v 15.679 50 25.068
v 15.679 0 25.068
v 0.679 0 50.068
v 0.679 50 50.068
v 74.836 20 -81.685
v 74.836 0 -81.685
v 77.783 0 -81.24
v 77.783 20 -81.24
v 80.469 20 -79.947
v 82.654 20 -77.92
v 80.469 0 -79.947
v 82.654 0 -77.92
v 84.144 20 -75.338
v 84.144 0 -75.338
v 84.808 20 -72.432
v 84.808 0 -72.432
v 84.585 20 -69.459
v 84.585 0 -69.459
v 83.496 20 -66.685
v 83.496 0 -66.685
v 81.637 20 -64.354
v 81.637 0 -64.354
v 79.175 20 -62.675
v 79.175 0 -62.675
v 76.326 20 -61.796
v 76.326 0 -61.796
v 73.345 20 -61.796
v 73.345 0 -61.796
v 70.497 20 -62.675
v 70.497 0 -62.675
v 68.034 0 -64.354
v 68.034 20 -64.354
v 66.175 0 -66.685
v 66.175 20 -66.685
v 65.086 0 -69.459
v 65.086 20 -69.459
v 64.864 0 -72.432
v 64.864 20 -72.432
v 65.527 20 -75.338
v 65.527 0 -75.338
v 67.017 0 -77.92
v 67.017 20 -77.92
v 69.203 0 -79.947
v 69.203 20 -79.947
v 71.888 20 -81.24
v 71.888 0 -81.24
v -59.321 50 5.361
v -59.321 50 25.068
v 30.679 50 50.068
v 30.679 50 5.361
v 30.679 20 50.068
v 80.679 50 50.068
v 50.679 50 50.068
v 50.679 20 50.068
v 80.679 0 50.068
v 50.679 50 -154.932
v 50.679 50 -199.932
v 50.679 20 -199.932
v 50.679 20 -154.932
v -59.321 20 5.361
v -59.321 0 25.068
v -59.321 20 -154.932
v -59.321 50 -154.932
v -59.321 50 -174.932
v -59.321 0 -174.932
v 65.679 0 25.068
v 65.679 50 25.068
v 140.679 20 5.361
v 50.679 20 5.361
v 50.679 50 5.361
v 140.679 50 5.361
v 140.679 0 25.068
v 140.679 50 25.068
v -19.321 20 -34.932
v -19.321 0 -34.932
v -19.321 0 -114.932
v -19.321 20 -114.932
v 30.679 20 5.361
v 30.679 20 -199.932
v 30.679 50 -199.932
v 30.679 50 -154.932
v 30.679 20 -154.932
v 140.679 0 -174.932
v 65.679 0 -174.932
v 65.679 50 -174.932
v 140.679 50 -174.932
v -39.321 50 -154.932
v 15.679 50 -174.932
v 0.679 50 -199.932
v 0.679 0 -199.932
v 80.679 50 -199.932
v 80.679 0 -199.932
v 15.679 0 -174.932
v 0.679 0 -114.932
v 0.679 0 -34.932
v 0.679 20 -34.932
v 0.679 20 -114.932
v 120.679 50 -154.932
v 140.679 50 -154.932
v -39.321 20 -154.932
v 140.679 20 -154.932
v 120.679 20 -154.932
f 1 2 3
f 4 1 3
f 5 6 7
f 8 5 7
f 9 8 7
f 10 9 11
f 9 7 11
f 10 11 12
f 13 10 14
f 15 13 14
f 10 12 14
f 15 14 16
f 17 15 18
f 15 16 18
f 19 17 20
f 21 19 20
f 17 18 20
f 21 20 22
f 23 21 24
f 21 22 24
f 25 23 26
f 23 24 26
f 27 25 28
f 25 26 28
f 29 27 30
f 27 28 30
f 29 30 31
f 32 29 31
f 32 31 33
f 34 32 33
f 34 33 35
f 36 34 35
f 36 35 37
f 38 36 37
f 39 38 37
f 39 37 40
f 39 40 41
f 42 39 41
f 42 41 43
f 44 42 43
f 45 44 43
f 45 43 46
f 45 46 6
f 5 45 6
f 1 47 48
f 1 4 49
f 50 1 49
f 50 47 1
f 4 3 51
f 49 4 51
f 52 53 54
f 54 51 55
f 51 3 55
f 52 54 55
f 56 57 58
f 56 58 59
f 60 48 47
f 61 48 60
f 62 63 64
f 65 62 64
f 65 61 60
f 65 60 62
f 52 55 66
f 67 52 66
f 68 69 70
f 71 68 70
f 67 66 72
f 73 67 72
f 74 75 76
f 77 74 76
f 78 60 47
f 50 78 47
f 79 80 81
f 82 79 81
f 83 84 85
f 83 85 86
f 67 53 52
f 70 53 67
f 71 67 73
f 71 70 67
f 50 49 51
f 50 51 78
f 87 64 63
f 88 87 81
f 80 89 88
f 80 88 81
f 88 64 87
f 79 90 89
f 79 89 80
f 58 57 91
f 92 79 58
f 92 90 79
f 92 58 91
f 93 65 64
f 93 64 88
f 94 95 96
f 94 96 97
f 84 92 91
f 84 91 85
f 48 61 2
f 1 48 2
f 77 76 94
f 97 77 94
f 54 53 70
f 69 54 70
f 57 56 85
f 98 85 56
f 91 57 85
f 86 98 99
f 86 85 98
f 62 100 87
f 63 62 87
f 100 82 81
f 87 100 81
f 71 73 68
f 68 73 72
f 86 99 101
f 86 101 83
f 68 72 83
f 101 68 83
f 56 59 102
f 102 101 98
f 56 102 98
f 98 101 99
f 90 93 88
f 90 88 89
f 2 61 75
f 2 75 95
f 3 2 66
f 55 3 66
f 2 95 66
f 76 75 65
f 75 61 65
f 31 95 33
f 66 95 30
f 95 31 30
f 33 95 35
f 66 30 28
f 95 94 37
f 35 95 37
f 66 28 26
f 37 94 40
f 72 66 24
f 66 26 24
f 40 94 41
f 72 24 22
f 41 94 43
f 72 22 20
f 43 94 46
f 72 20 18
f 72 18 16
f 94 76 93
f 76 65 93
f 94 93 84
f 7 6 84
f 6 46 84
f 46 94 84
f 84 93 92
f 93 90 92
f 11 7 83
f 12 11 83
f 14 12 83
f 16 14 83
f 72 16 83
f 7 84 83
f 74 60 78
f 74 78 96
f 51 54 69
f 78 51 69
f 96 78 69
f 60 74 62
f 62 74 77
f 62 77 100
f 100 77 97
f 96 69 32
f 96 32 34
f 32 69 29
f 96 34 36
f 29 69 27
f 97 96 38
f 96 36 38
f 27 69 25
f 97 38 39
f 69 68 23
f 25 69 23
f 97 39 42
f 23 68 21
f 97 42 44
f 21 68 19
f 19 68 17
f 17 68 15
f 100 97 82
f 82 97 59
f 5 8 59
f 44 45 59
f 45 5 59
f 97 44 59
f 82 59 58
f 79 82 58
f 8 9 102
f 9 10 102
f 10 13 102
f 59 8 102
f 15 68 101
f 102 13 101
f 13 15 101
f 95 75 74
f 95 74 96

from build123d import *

# Parameters (mm, degrees)
SKETCH1_W           = 200
SKETCH1_H           = 200
SKETCH1_W_2         = 20
SKETCH1_H_2         = 80
BOSS_EXTRUDE1_DEPTH = 50
SHELL1_START        = 20.678946788
SHELL1_OUTLINE_W    = 30
SHELL1_OUTLINE_H    = 160
SHELL1_DEPTH        = 100
SHELL1_START_2      = -39.321053212
SHELL1_2_OUTLINE_W  = 30
SHELL1_2_OUTLINE_H  = 20
SHELL1_2_DEPTH      = 60
SKETCH4_W           = 60
SKETCH4_H           = 120
CUT_EXTRUDE1_DEPTH  = 30
BOSS_EXTRUDE2_DEPTH = 50
SKETCH6_W           = 20
SKETCH6_H           = 45
CUT_EXTRUDE2_DEPTH  = 30
SKETCH7_R           = 10
CUT_EXTRUDE3_DEPTH  = 28
SKETCH8_W           = 160.292931591
SKETCH8_H           = 30
CUT_EXTRUDE4_DEPTH  = 213


# Read off the part's stored shape, not the designer's step: Shell1
with BuildPart() as part:
    # Sketch1 → Boss-Extrude1 (new body)
    with BuildSketch(Plane(origin=(0, 0, 0), x_dir=(1, 0, 0), z_dir=(0, 1, 0))):
        with Locations((40.678946788, 74.932071062)):
            Rectangle(SKETCH1_W, SKETCH1_H)
        with Locations((-9.321053212, 74.932071062)):
            Rectangle(SKETCH1_W_2, SKETCH1_H_2, mode=Mode.SUBTRACT)
    extrude(amount=BOSS_EXTRUDE1_DEPTH)

    # Shell1 outline → Shell1 (cut)
    with BuildSketch(Plane.YZ.offset(SHELL1_START)):
        with Locations((35, -74.932071062)):
            Rectangle(SHELL1_OUTLINE_W, SHELL1_OUTLINE_H)
    extrude(amount=SHELL1_DEPTH, mode=Mode.SUBTRACT)

    # Shell1 2 outline → Shell1 2 (cut)
    with BuildSketch(Plane.YZ.offset(SHELL1_START_2)):
        with Locations((35, -144.932071062)):
            Rectangle(SHELL1_2_OUTLINE_W, SHELL1_2_OUTLINE_H)
        with Locations((35, -4.932071062)):
            Rectangle(SHELL1_2_OUTLINE_W, SHELL1_2_OUTLINE_H)
    extrude(amount=SHELL1_2_DEPTH, mode=Mode.SUBTRACT)

    # Sketch4 → Cut-Extrude1 (cut)
    with BuildSketch(Plane(origin=(0, 50, 0), x_dir=(1, 0, 0), z_dir=(0, 1, 0))):
        with Locations((-9.321053212, 74.932071062)):
            Rectangle(SKETCH4_W, SKETCH4_H)
    extrude(amount=-CUT_EXTRUDE1_DEPTH, mode=Mode.SUBTRACT)

    # Sketch5 → Boss-Extrude2 (add)
    with BuildSketch(Plane.XZ):
        Polygon((40.678946788, 25.067928938), (15.678946788, 25.067928938), (0.678946788, 50.067928938), (80.678946788, 50.067928938), (65.678946788, 25.067928938), align=None)
    boss_extrude2 = extrude(amount=-BOSS_EXTRUDE2_DEPTH)

    # Sketch6 → Cut-Extrude2 (cut)
    with BuildSketch(Plane(origin=(0, 50, 0), x_dir=(1, 0, 0), z_dir=(0, 1, 0))):
        with Locations((40.678946788, -27.567928938)):
            Rectangle(SKETCH6_W, SKETCH6_H)
    cut_extrude2 = extrude(amount=-CUT_EXTRUDE2_DEPTH, mode=Mode.SUBTRACT)

    # Mirror1: Boss-Extrude2, Cut-Extrude2 across plane
    add(boss_extrude2.mirror(Plane.XY.offset(-74.932071062)))
    add(cut_extrude2.mirror(Plane.XY.offset(-74.932071062)), mode=Mode.SUBTRACT)

    # Sketch7 → Cut-Extrude3 (cut)
    with BuildSketch(Plane(origin=(0, 0, 0), x_dir=(-1, 0, 0), z_dir=(0, -1, 0))):
        with Locations(Location((-74.835730419, 71.684680876, 0), (0, 0, 90))):
            Circle(SKETCH7_R)
    extrude(amount=-CUT_EXTRUDE3_DEPTH, mode=Mode.SUBTRACT)

    # Sketch8 → Cut-Extrude4 (cut)
    with BuildSketch(Plane(origin=(140.678946788, 0, 0), x_dir=(0, 0, -1), z_dir=(1, 0, 0))):
        with Locations((74.785605266, 35)):
            Rectangle(SKETCH8_W, SKETCH8_H)
    extrude(amount=-CUT_EXTRUDE4_DEPTH, mode=Mode.SUBTRACT)


solid = part.part
